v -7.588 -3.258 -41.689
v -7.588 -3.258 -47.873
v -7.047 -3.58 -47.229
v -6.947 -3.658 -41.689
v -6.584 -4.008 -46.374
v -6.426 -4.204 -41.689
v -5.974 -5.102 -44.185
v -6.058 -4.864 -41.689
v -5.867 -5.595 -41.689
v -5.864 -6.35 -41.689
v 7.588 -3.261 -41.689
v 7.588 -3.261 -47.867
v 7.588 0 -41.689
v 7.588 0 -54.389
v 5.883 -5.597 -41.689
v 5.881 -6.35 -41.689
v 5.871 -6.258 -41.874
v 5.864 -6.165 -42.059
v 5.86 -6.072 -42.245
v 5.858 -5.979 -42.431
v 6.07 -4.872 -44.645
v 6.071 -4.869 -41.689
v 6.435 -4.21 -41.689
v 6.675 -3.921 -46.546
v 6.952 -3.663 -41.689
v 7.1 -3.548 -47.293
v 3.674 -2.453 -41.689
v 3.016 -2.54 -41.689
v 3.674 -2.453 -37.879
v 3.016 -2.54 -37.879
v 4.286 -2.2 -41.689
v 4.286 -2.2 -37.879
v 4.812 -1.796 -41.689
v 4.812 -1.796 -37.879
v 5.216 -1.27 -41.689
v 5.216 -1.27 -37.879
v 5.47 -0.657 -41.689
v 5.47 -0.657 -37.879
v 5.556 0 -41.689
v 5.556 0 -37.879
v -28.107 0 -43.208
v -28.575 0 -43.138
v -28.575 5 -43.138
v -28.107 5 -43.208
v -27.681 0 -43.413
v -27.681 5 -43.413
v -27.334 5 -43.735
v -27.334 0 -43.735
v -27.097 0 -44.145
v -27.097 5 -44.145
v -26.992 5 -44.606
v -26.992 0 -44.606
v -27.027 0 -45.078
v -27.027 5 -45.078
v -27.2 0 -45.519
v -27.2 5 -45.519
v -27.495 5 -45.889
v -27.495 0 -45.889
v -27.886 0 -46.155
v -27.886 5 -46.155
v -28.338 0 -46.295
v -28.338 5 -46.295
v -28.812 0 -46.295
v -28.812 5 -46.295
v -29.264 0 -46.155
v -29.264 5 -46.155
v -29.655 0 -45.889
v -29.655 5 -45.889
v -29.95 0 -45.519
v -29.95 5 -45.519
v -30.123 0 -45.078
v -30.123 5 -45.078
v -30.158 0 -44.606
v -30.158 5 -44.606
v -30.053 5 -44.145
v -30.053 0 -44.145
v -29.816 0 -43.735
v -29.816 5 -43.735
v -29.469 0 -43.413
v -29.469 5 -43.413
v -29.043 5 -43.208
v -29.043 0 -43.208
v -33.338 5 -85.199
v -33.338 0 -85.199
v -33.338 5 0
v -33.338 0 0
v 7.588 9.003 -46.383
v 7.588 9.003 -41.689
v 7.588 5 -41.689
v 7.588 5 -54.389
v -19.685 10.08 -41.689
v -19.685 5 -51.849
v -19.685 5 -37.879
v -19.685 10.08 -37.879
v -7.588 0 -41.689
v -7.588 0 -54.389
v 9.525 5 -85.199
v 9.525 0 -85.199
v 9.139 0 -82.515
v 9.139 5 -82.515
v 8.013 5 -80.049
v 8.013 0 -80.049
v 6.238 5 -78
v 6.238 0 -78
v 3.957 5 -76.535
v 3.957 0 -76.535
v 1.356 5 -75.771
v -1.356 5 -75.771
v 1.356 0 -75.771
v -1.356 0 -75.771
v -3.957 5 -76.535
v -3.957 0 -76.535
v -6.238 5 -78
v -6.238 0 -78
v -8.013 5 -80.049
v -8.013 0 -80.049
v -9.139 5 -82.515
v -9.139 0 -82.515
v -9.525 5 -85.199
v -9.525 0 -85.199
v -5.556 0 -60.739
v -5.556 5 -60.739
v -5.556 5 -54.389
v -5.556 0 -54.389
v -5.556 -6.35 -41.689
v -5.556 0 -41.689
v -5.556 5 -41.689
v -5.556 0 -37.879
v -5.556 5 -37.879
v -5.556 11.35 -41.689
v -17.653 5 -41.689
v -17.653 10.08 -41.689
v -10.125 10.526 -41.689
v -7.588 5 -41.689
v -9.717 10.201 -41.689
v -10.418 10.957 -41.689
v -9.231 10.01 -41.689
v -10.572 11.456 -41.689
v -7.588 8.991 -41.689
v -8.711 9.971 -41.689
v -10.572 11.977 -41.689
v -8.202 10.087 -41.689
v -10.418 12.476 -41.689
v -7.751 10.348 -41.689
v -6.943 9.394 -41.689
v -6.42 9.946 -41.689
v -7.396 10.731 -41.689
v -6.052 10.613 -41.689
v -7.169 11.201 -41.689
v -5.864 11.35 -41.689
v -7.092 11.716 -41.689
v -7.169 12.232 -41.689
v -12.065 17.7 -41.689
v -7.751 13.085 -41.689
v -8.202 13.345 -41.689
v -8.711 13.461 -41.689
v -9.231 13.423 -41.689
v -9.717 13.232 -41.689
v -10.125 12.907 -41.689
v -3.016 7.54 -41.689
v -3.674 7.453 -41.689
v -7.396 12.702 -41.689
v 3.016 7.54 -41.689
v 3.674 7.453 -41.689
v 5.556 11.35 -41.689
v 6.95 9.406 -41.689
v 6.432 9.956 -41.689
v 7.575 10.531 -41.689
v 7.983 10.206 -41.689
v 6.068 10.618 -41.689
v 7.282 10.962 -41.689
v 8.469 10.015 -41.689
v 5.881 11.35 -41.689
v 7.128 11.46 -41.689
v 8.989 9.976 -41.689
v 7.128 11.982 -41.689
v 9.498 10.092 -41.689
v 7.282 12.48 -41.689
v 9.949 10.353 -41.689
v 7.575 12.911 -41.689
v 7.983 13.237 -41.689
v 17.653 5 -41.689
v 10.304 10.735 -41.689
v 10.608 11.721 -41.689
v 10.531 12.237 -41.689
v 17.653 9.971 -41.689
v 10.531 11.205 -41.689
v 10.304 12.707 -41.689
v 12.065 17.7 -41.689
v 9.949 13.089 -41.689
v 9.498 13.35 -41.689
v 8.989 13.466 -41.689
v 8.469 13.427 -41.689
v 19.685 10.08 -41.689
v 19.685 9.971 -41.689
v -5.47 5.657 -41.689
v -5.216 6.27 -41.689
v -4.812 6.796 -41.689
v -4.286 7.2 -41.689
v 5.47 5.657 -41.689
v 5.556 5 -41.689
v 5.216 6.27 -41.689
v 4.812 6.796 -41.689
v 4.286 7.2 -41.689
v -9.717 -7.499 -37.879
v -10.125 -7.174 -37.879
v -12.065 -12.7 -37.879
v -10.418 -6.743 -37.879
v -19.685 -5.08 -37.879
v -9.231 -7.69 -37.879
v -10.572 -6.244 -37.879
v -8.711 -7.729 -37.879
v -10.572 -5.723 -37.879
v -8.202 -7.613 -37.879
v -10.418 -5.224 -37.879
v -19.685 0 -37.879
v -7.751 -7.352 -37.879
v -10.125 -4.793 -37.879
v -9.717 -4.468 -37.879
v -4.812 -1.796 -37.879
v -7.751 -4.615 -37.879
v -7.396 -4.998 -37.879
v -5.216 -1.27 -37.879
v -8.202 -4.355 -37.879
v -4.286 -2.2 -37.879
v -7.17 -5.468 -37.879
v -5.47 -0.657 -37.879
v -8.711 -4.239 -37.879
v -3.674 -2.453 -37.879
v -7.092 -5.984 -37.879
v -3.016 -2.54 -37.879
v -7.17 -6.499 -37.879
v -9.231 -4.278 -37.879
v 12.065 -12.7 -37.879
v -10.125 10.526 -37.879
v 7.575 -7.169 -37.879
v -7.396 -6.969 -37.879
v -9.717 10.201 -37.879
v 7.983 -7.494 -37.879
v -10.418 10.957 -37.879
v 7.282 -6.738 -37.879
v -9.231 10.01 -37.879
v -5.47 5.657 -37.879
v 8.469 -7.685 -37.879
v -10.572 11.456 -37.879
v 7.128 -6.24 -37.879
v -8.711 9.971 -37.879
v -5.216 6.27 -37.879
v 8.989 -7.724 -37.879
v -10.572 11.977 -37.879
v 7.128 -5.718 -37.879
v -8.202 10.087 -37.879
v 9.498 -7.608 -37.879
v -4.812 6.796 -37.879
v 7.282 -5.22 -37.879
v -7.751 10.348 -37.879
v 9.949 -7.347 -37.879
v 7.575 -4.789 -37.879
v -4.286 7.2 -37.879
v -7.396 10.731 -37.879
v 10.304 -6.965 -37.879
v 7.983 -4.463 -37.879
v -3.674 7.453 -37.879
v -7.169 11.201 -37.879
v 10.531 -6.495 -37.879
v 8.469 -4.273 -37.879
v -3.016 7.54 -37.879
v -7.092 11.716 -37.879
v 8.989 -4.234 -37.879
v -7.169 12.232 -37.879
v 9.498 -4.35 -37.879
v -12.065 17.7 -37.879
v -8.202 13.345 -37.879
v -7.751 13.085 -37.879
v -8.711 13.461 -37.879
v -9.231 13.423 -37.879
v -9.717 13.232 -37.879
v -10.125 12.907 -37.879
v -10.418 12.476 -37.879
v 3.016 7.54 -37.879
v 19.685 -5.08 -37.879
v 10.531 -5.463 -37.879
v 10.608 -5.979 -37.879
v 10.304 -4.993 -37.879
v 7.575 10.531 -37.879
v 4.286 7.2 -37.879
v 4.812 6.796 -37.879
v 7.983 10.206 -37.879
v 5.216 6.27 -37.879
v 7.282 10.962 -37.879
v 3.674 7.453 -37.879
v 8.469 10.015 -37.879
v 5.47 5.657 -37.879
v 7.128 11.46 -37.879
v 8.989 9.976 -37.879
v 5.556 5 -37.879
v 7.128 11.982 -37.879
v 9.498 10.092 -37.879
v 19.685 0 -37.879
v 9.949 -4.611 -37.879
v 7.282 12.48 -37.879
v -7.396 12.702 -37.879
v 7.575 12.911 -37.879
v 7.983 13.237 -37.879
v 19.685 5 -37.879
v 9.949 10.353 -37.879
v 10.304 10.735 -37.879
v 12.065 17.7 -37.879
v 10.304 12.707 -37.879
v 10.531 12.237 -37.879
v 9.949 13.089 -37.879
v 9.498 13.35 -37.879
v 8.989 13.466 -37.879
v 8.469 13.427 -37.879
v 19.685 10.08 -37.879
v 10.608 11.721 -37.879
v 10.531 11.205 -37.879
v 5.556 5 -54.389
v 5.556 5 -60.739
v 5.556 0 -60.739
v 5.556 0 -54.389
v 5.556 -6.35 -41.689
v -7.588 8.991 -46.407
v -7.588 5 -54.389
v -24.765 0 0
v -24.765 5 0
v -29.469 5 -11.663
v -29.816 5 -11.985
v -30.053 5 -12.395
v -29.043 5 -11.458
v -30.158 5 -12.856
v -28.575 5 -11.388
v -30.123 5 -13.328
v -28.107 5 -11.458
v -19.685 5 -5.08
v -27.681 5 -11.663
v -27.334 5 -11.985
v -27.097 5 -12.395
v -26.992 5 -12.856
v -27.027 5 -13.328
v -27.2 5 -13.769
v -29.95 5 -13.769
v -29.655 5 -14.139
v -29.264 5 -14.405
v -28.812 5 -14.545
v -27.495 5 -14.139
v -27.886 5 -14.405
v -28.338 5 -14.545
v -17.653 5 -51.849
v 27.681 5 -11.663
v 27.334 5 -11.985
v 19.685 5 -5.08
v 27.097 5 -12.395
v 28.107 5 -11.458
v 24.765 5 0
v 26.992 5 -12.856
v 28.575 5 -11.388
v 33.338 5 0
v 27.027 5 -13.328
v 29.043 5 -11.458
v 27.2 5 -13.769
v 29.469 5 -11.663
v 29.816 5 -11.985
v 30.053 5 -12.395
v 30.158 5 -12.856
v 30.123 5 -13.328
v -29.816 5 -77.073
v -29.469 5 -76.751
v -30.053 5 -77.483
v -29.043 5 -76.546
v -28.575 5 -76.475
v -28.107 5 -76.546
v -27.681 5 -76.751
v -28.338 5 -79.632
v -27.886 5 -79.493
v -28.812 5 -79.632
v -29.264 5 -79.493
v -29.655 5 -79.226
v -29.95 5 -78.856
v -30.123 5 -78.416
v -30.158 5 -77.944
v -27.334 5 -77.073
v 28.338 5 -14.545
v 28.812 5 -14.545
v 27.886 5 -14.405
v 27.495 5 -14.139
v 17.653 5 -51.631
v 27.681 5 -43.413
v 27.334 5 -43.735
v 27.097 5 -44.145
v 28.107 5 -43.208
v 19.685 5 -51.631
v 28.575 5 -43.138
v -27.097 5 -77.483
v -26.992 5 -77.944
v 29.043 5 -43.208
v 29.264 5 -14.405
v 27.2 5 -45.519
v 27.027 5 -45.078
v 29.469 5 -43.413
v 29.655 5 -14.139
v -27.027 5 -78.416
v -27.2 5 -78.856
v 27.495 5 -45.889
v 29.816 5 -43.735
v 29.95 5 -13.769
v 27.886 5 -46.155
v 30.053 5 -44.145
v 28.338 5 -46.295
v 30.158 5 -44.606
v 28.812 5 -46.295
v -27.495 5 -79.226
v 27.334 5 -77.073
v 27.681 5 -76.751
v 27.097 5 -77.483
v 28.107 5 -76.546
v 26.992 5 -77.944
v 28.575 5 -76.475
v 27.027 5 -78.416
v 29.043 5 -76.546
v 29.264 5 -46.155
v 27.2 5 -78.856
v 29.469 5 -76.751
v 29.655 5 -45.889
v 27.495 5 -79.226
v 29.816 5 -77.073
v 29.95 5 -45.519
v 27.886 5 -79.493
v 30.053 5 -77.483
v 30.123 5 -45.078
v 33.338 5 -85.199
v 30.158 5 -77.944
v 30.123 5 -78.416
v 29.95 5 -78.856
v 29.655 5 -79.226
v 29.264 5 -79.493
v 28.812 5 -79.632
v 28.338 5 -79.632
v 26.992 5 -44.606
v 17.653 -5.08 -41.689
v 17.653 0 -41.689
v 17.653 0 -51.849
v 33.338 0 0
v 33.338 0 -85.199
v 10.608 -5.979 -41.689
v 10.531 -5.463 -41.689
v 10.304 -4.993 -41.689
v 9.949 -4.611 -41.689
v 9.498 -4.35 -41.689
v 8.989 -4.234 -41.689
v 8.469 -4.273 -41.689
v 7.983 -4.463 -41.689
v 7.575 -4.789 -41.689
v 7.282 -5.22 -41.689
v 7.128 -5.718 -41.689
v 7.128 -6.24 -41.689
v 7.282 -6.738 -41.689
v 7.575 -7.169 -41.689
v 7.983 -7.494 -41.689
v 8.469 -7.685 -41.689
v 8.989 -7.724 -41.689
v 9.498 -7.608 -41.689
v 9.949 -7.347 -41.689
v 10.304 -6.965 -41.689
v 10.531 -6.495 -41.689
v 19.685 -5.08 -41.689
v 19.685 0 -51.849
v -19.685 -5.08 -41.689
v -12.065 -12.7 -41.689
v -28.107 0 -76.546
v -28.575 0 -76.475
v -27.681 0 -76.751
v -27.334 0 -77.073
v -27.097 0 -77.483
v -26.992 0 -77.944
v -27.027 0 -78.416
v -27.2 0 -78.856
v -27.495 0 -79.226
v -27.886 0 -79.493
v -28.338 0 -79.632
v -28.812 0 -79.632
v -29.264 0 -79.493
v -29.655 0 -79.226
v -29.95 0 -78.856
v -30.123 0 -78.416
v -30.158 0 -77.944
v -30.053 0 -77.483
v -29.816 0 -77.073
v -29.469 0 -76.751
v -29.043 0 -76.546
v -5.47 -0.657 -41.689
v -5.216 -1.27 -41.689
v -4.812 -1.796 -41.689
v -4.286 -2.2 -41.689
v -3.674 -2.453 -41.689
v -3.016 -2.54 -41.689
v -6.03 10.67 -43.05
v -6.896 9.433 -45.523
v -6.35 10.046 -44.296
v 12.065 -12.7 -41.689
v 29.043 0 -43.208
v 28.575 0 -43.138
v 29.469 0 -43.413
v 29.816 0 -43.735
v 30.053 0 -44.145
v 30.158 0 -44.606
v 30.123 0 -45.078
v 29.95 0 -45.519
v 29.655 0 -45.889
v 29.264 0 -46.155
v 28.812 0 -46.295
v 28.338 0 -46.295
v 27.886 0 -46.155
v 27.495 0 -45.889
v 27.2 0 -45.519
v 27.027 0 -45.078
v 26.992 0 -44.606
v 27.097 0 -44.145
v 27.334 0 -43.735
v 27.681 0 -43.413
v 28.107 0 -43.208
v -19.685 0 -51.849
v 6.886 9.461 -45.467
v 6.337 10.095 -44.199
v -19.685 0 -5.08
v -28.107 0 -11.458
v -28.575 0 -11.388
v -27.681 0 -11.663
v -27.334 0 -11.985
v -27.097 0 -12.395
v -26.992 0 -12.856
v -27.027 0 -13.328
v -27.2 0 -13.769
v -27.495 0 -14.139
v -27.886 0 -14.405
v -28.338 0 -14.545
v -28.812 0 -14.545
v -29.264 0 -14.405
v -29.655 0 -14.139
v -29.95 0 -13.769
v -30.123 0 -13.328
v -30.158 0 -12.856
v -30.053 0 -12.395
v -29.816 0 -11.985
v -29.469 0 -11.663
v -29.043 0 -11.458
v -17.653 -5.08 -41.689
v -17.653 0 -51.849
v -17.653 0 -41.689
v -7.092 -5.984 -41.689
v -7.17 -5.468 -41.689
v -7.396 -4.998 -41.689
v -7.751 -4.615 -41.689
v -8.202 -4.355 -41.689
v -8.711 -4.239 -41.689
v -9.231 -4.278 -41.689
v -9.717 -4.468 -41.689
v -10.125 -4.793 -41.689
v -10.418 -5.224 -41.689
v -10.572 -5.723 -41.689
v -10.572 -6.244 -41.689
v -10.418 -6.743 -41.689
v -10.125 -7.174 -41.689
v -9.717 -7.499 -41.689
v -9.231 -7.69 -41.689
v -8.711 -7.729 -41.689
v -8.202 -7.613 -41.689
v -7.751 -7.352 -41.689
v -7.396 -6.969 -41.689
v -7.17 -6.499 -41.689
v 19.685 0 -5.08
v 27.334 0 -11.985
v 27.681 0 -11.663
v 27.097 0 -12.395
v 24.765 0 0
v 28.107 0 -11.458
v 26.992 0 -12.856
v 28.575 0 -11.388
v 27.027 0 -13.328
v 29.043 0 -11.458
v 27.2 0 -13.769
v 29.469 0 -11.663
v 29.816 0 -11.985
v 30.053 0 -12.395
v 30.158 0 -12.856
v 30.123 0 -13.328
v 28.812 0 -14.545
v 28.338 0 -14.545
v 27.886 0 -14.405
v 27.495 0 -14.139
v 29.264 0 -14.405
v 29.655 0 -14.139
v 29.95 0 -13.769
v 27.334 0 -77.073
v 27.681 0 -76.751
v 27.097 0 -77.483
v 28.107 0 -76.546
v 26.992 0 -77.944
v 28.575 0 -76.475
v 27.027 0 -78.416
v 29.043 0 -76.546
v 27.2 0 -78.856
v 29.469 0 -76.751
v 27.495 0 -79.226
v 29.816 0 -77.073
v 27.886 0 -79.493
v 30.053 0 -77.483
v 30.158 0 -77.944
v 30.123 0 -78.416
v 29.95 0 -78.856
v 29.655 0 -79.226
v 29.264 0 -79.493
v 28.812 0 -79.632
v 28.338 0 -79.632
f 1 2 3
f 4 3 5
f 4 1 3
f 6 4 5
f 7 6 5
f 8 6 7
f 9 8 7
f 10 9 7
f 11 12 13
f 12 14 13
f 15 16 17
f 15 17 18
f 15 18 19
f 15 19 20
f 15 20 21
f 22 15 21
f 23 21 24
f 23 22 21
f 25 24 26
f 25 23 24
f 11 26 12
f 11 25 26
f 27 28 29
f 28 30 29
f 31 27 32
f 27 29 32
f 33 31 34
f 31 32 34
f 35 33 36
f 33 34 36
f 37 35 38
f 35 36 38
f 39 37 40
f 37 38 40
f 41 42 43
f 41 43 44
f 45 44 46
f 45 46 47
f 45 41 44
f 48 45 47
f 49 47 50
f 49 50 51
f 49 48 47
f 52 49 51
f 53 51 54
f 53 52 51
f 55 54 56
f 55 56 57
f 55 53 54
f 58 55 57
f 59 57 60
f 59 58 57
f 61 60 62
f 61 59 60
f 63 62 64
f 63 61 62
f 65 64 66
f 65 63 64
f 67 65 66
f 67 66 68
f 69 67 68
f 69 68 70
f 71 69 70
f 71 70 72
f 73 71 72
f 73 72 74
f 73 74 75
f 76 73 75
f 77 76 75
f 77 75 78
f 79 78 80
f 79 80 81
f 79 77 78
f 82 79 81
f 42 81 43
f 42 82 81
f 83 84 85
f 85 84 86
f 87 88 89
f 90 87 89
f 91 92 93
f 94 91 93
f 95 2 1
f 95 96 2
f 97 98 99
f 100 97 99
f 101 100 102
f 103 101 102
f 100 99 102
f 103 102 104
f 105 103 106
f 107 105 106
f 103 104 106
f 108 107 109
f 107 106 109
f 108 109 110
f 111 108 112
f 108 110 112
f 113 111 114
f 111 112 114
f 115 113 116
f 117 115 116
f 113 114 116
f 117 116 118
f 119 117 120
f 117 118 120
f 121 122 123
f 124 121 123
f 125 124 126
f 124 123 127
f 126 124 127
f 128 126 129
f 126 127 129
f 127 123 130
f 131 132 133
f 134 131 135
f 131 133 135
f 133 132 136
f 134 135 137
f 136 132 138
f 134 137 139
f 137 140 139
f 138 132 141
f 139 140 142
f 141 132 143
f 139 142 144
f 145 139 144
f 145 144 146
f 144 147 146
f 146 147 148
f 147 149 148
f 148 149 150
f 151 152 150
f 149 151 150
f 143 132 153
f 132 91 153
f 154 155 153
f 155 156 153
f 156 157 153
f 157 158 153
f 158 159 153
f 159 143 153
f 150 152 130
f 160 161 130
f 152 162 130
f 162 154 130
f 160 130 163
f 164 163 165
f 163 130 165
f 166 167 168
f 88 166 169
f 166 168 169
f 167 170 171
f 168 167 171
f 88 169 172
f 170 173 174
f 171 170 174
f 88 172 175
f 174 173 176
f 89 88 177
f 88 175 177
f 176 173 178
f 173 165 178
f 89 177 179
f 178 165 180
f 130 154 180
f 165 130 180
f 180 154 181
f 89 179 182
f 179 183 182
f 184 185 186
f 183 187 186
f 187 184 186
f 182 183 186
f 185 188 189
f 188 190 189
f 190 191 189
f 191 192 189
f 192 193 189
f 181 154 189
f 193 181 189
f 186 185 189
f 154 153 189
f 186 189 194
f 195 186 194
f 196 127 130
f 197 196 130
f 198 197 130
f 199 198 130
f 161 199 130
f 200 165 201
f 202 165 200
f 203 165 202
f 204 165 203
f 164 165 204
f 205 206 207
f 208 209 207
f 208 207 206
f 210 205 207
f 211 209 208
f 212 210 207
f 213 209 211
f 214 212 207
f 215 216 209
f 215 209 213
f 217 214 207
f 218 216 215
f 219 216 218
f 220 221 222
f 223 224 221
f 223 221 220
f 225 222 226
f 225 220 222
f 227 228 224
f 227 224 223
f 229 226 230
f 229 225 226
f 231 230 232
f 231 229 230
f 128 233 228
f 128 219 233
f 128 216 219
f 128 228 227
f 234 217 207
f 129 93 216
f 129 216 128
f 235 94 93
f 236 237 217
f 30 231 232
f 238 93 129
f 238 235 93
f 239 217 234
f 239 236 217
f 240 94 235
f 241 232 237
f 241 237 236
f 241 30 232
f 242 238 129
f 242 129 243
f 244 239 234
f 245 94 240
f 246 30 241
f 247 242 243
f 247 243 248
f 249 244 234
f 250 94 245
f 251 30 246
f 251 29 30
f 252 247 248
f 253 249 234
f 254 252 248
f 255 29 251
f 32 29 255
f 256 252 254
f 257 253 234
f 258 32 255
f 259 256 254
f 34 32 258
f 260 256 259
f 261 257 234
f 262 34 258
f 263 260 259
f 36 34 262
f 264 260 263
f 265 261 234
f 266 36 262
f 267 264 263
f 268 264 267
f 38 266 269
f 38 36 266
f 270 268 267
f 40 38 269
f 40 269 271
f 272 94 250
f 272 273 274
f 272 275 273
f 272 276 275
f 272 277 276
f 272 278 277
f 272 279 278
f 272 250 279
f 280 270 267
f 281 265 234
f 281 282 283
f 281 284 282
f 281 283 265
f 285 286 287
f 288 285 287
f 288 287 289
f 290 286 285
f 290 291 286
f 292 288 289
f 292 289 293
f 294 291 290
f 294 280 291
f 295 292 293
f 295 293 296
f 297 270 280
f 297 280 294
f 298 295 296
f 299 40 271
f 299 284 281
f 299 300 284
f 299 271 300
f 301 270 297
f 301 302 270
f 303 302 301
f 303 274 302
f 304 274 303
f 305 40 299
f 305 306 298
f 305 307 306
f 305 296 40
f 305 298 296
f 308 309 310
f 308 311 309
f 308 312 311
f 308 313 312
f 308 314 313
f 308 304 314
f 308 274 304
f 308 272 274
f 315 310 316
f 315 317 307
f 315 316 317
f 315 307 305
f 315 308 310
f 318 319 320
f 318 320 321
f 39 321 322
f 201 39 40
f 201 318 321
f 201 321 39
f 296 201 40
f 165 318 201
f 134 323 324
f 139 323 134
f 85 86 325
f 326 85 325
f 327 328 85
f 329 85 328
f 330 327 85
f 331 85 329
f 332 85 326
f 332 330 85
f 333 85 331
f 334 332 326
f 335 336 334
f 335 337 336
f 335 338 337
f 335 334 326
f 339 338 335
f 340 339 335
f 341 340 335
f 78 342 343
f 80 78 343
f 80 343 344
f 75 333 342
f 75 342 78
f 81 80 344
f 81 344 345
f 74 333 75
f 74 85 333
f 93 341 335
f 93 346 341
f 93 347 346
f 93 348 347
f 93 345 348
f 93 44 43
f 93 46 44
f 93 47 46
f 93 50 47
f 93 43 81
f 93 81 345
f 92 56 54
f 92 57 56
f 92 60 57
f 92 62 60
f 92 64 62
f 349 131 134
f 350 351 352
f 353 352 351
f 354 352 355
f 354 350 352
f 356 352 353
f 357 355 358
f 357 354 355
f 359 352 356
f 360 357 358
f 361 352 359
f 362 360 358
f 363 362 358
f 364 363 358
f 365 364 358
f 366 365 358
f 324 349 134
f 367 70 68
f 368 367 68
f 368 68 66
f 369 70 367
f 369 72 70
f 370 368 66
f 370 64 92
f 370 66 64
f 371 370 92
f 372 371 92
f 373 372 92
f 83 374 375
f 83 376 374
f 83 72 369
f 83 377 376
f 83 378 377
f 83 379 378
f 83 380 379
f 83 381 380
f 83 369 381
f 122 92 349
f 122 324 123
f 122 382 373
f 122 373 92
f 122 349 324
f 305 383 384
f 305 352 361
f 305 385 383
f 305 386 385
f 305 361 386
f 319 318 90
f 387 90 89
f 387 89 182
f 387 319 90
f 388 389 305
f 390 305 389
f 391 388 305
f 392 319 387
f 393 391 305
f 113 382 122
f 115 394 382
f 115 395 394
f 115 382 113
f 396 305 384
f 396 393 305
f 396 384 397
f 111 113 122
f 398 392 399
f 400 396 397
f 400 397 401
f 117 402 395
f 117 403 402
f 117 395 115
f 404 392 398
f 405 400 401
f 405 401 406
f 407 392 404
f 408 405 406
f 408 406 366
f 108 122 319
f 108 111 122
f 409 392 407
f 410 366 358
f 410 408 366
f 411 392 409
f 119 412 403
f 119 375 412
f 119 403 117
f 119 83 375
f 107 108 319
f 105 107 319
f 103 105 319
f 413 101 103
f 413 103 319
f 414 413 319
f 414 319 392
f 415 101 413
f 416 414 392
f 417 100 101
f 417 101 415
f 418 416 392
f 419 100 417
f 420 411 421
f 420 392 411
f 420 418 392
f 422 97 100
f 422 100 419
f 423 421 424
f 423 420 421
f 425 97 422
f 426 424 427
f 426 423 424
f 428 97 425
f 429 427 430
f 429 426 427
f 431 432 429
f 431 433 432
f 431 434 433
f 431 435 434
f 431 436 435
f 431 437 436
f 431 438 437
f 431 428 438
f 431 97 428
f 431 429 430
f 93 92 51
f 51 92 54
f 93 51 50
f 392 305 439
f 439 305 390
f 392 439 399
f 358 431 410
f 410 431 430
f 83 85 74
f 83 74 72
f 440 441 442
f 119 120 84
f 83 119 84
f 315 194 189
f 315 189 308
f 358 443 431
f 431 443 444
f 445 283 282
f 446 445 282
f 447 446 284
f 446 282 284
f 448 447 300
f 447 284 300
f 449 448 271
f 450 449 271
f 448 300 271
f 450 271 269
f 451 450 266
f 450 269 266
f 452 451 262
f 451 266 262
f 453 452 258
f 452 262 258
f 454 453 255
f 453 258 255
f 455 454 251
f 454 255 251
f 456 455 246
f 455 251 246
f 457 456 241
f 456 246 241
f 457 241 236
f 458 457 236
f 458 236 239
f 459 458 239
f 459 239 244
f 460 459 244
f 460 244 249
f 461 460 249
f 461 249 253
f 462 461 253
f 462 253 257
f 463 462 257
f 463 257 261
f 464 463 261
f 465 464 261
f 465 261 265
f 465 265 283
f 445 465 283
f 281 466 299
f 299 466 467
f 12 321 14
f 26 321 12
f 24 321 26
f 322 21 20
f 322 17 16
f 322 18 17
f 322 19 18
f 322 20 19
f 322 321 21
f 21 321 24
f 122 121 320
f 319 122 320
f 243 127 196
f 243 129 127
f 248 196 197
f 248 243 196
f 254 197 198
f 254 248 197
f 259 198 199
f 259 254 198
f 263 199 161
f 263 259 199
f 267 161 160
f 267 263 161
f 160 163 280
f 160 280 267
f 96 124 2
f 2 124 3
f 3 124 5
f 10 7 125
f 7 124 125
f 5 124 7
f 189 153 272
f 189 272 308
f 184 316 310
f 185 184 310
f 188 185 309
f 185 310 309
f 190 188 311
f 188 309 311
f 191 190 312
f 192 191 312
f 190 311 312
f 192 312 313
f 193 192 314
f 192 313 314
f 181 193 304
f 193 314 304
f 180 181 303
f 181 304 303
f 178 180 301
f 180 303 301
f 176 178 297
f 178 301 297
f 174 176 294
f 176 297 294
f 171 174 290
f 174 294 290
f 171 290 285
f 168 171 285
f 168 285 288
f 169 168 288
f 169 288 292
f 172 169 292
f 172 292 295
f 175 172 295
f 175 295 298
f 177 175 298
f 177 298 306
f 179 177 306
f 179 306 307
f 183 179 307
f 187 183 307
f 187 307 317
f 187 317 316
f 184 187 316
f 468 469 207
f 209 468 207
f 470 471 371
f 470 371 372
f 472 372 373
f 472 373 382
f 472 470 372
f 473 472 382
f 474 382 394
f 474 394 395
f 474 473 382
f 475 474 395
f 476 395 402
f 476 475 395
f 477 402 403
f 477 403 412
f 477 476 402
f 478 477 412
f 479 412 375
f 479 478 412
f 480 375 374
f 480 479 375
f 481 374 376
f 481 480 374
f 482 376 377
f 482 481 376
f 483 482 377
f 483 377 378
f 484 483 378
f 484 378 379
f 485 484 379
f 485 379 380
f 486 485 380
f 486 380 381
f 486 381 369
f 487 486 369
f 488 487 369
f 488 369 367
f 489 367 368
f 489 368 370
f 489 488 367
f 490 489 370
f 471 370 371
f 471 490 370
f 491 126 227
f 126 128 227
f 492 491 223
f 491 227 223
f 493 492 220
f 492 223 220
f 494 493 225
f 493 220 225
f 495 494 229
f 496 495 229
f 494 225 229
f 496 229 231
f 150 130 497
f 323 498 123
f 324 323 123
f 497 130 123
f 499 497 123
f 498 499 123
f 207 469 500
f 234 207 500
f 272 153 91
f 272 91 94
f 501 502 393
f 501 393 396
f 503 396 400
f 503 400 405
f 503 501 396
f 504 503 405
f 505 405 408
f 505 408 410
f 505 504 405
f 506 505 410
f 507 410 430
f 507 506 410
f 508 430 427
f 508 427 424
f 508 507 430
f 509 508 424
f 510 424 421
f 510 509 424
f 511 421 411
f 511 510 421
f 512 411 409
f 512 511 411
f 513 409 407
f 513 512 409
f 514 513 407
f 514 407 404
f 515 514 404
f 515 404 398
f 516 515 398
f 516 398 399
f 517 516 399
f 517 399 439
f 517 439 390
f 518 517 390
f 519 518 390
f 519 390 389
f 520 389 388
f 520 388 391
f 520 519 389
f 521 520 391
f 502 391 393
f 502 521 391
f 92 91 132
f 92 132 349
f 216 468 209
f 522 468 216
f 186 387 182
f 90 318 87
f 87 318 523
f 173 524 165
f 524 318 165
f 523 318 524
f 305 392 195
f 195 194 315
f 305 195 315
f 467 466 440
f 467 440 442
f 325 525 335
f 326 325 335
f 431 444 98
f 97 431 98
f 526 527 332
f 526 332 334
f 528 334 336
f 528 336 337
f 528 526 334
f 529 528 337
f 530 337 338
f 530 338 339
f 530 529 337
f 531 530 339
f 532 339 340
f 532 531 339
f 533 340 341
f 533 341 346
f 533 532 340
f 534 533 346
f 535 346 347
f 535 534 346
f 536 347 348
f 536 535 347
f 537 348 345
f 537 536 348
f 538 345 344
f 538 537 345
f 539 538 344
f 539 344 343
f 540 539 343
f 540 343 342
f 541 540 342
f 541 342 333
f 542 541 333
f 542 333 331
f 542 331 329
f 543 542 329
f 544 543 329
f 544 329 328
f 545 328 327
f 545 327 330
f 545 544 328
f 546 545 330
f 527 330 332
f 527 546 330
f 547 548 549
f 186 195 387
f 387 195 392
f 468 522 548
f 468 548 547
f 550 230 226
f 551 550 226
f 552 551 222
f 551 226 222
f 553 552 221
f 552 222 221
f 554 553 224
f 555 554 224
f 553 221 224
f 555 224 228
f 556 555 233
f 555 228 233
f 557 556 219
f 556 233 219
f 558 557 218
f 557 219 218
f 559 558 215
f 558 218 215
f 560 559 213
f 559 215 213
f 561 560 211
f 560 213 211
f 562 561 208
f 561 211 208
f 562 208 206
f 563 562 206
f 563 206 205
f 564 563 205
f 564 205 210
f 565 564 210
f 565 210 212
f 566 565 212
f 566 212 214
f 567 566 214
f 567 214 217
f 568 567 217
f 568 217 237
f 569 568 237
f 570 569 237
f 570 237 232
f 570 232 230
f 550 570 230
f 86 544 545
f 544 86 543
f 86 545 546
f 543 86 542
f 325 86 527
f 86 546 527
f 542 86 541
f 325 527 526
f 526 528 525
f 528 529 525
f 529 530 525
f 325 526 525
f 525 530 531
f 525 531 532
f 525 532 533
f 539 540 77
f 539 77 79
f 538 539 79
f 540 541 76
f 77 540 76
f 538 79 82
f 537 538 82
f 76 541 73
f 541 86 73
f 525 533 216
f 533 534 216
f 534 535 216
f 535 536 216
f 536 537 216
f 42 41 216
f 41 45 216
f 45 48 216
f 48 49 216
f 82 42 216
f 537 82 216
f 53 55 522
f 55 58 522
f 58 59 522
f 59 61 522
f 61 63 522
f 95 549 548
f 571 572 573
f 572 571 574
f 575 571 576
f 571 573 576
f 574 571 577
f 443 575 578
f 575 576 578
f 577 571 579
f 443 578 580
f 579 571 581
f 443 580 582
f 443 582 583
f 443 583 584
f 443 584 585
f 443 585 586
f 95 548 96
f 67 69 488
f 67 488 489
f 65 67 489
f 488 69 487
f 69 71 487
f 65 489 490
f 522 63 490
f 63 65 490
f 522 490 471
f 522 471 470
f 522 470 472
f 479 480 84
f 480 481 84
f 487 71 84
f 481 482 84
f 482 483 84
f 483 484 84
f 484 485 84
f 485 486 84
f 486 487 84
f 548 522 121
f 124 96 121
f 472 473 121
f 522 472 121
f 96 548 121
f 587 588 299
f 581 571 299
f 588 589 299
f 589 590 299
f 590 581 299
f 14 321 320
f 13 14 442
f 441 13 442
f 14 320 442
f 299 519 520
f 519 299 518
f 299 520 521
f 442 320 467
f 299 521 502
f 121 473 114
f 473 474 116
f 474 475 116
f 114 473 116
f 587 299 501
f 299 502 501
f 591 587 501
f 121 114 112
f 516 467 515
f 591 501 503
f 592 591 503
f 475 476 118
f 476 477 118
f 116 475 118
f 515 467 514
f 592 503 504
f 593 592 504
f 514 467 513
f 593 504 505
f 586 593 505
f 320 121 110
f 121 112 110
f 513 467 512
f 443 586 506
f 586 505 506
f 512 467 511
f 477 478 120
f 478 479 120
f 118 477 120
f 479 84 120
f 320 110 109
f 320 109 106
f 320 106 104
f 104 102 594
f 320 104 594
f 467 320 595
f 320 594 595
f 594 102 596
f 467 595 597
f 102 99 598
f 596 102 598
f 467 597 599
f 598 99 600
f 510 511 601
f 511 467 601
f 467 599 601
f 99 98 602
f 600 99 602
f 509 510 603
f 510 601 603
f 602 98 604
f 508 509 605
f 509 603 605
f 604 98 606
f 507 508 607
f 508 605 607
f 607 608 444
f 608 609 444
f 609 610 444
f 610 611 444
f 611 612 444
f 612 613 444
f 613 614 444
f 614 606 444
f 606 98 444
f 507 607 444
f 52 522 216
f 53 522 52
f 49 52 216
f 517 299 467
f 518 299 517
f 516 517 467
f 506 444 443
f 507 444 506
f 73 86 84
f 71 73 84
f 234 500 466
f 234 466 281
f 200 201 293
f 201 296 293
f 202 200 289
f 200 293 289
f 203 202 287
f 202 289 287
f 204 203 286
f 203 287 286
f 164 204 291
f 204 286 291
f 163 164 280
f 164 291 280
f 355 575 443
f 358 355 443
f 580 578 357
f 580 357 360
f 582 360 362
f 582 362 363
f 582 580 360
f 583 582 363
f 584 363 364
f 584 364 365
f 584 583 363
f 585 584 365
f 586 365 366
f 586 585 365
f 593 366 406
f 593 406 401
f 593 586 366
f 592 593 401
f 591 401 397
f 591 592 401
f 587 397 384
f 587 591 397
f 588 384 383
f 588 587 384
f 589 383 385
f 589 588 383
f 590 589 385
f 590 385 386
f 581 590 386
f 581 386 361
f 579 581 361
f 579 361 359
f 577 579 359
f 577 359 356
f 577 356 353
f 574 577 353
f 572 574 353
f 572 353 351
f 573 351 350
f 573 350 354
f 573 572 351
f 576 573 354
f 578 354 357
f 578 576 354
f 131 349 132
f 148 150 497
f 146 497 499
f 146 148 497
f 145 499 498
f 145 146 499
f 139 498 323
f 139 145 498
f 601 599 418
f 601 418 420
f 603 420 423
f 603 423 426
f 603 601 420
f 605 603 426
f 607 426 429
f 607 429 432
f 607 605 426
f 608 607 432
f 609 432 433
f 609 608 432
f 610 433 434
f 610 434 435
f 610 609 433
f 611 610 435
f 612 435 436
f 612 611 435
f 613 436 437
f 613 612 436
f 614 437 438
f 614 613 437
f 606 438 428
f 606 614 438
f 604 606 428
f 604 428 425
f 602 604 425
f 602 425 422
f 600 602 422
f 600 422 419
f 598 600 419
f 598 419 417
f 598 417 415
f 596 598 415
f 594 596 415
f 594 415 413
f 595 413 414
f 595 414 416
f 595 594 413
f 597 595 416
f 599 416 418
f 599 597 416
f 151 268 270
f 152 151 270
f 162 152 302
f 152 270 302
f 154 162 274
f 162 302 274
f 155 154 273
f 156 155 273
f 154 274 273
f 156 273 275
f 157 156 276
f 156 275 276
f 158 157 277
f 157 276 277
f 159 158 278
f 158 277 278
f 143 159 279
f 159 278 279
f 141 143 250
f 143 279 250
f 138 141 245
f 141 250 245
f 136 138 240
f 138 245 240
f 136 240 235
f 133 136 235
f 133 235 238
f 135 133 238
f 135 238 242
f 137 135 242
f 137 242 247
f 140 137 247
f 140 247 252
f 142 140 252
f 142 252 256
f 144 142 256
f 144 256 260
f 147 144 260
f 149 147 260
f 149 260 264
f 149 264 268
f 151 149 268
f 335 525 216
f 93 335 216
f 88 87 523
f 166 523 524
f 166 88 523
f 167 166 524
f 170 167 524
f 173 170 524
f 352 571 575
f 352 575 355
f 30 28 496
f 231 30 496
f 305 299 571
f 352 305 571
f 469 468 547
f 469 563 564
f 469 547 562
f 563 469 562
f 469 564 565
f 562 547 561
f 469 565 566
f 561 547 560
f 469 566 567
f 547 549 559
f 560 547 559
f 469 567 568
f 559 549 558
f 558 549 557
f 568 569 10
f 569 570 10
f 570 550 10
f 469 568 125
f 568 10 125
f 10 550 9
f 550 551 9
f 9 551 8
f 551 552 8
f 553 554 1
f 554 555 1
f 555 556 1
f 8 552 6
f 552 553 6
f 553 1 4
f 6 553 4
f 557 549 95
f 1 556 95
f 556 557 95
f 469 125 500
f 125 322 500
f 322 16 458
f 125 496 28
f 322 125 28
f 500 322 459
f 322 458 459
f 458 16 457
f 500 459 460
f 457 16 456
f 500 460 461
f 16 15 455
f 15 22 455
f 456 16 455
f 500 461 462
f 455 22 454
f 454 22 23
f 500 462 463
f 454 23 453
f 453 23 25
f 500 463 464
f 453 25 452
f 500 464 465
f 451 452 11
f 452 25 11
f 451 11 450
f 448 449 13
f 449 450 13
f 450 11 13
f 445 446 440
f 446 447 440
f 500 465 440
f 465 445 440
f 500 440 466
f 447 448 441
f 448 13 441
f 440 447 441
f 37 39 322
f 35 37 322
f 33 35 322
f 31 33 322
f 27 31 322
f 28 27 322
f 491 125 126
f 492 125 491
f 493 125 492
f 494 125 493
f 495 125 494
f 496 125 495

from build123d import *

# Parameters (mm, degrees)
SKETCH1_R           = 1.5875
BOSS_EXTRUDE1_DEPTH = 5
SKETCH2_W           = 39.37
SKETCH2_H           = 30.4
BOSS_EXTRUDE2_DEPTH = 3.81
SKETCH3_W           = 11.1125
SKETCH3_H           = 10.08
CUT_EXTRUDE1_DEPTH  = 3.81
FILLET1_R           = 2.54
CHAMFER1_SIZE       = 7.62
CHAMFER2_SIZE       = 5.08
BOSS_EXTRUDE3_DEPTH = 2.032
BOSS_EXTRUDE4_DEPTH = 2.032
BOSS_EXTRUDE5_DEPTH = 2.032
BOSS_EXTRUDE6_DEPTH = 2.032
SKETCH8_R           = 1.75
SKETCH8_R_2         = 1.7499965
CUT_EXTRUDE2_DEPTH  = 20.32
SKETCH9_R           = 3
CUT_EXTRUDE3_DEPTH  = 10.16
BOSS_EXTRUDE7_DEPTH = 2.032
BOSS_EXTRUDE8_DEPTH = 2.032


with BuildPart() as part:
    # Sketch1 → Boss-Extrude1 (new body)
    with BuildSketch(Plane(origin=(0, 0, 0), x_dir=(1, 0, 0), z_dir=(0, 1, 0))):
        with BuildLine():
            Line((-33.3375, 0), (-19.685, 0))
            Line((-19.685, 0), (-19.685, 41.68899781))
            Line((-19.685, 41.68899781), (-5.55625, 41.68899781))
            Line((-5.55625, 41.68899781), (-5.55625, 60.73899781))
            Line((-5.55625, 60.73899781), (5.55625, 60.73899781))
            Line((5.55625, 60.73899781), (5.55625, 41.68899781))
            Line((5.55625, 41.68899781), (19.685, 41.68899781))
            Line((19.685, 41.68899781), (19.685, 0))
            Line((19.685, 0), (33.3375, 0))
            Line((33.3375, 0), (33.3375, 85.198868165))
            Line((33.3375, 85.198868165), (9.525, 85.198868165))
            ThreePointArc((9.525, 85.198868165), (0, 75.673868165), (-9.525, 85.198868165))
            Line((-9.525, 85.198868165), (-33.3375, 85.198868165))
            Line((-33.3375, 85.198868165), (-33.3375, 0))
        make_face()
        with Locations(Location((-28.575, 12.975059538, 0), (0, 0, 270))):
            Circle(SKETCH1_R, mode=Mode.SUBTRACT)
        with Locations(Location((28.575, 12.975059538, 0), (0, 0, 270))):
            Circle(SKETCH1_R, mode=Mode.SUBTRACT)
        with Locations(Location((-28.575, 44.725059538, 0), (0, 0, 270))):
            Circle(SKETCH1_R, mode=Mode.SUBTRACT)
        with Locations(Location((-28.575, 78.062559538, 0), (0, 0, 270))):
            Circle(SKETCH1_R, mode=Mode.SUBTRACT)
        with Locations(Location((28.575, 44.725059538, 0), (0, 0, 270))):
            Circle(SKETCH1_R, mode=Mode.SUBTRACT)
        with Locations(Location((28.575, 78.062559538, 0), (0, 0, 270))):
            Circle(SKETCH1_R, mode=Mode.SUBTRACT)
    extrude(amount=BOSS_EXTRUDE1_DEPTH)

    # Sketch2 → Boss-Extrude2 (add)
    with BuildSketch(Plane.XY.offset(-41.68899781)):
        with Locations((0, 2.5)):
            Rectangle(SKETCH2_W, SKETCH2_H)
    extrude(amount=BOSS_EXTRUDE2_DEPTH)

    # Sketch3 → Cut-Extrude1 (cut)
    with BuildSketch(Plane(origin=(0, 0, -41.68899781), x_dir=(-1, 0, 0), z_dir=(0, 0, -1))):
        with Locations((0, 2.5)):
            Rectangle(SKETCH3_W, SKETCH3_H)
    extrude(amount=-CUT_EXTRUDE1_DEPTH, mode=Mode.SUBTRACT)

    # Fillet1
    fillet1_edges = [part.edges().sort_by_distance(p)[0] for p in [
        (5.55625, -2.54, -39.78399781),
        (-5.55625, -2.54, -39.78399781),
        (5.55625, 7.54, -39.78399781),
        (-5.55625, 7.54, -39.78399781),
    ]]
    fillet(fillet1_edges, radius=FILLET1_R)

    # Chamfer1
    chamfer1_edges = [part.edges().sort_by_distance(p)[0] for p in [
        (19.685, -12.7, -39.78399781),
        (-19.685, 17.7, -39.78399781),
        (-19.685, -12.7, -39.78399781),
        (19.685, 17.7, -39.78399781),
    ]]
    chamfer(chamfer1_edges, length=CHAMFER1_SIZE)

    # Chamfer2
    chamfer2_edges = [part.edges().sort_by_distance(p)[0] for p in [
        (19.685, 2.5, 0),
        (-19.685, 2.5, 0),
    ]]
    chamfer(chamfer2_edges, length=CHAMFER2_SIZE)

    # Sketch4 → Boss-Extrude3 (add)
    with BuildSketch(Plane.ZY.offset(-5.55625)):
        Polygon((-41.68899781, 5), (-54.38899781, 5), (-41.68899781, 11.35), align=None)
    extrude(amount=-BOSS_EXTRUDE3_DEPTH)

    # Sketch5 → Boss-Extrude4 (add)
    with BuildSketch(Plane(origin=(-5.55625, 0, 0), x_dir=(0, 0, -1), z_dir=(1, 0, 0))):
        Polygon((54.38899781, 5), (41.68899781, 5), (41.68899781, 11.35), align=None)
    extrude(amount=-BOSS_EXTRUDE4_DEPTH)

    # Sketch6 → Boss-Extrude5 (add)
    with BuildSketch(Plane(origin=(-5.55625, 0, 0), x_dir=(0, 0, -1), z_dir=(1, 0, 0))):
        Polygon((41.68899781, 0), (54.38899781, 0), (41.68899781, -6.35), align=None)
    extrude(amount=-BOSS_EXTRUDE5_DEPTH)

    # Sketch7 → Boss-Extrude6 (add)
    with BuildSketch(Plane.ZY.offset(-5.55625)):
        Polygon((-41.68899781, 0), (-54.38899781, 0), (-41.68899781, -6.35), align=None)
    extrude(amount=-BOSS_EXTRUDE6_DEPTH)

    # Sketch8 → Cut-Extrude2 (cut)
    with BuildSketch(Plane.XY.offset(-37.87899781)):
        with Locations((-8.841749375, 11.716378166)):
            Circle(SKETCH8_R)
        with Locations((8.85825, 11.721080704)):
            Circle(SKETCH8_R)
        with Locations((8.85825, -5.978919296)):
            Circle(SKETCH8_R)
        with Locations((-8.841749375, -5.983621834)):
            Circle(SKETCH8_R_2)
    extrude(amount=-CUT_EXTRUDE2_DEPTH, mode=Mode.SUBTRACT)

    # Sketch9 → Cut-Extrude3 (cut)
    with BuildSketch(Plane(origin=(0, 0, -41.68899781), x_dir=(-1, 0, 0), z_dir=(0, 0, -1))):
        with Locations((-8.85825, 11.721080704)):
            Circle(SKETCH9_R)
        with Locations((8.841749375, 11.716378166)):
            Circle(SKETCH9_R)
        with Locations((8.841749375, -5.983621834)):
            Circle(SKETCH9_R)
        with Locations((-8.85825, -5.978919296)):
            Circle(SKETCH9_R)
    extrude(amount=CUT_EXTRUDE3_DEPTH, mode=Mode.SUBTRACT)

    # Sketch10 → Boss-Extrude7 (add)
    with BuildSketch(Plane(origin=(19.685, 0, 0), x_dir=(0, 0, -1), z_dir=(1, 0, 0))):
        Polygon((41.68899781, 9.971080704), (51.631159218, 5), (41.68899781, 5), align=None)
        Polygon((41.68899781, -5.08), (51.84899781, 0), (41.68899781, 0), align=None)
    extrude(amount=-BOSS_EXTRUDE7_DEPTH)

    # Sketch11 → Boss-Extrude8 (add)
    with BuildSketch(Plane.ZY.offset(19.685)):
        Polygon((-41.68899781, 10.08), (-51.84899781, 5), (-41.68899781, 5), align=None)
        Polygon((-41.68899781, -5.08), (-41.68899781, 0), (-51.84899781, 0), align=None)
    extrude(amount=-BOSS_EXTRUDE8_DEPTH)


solid = part.part
